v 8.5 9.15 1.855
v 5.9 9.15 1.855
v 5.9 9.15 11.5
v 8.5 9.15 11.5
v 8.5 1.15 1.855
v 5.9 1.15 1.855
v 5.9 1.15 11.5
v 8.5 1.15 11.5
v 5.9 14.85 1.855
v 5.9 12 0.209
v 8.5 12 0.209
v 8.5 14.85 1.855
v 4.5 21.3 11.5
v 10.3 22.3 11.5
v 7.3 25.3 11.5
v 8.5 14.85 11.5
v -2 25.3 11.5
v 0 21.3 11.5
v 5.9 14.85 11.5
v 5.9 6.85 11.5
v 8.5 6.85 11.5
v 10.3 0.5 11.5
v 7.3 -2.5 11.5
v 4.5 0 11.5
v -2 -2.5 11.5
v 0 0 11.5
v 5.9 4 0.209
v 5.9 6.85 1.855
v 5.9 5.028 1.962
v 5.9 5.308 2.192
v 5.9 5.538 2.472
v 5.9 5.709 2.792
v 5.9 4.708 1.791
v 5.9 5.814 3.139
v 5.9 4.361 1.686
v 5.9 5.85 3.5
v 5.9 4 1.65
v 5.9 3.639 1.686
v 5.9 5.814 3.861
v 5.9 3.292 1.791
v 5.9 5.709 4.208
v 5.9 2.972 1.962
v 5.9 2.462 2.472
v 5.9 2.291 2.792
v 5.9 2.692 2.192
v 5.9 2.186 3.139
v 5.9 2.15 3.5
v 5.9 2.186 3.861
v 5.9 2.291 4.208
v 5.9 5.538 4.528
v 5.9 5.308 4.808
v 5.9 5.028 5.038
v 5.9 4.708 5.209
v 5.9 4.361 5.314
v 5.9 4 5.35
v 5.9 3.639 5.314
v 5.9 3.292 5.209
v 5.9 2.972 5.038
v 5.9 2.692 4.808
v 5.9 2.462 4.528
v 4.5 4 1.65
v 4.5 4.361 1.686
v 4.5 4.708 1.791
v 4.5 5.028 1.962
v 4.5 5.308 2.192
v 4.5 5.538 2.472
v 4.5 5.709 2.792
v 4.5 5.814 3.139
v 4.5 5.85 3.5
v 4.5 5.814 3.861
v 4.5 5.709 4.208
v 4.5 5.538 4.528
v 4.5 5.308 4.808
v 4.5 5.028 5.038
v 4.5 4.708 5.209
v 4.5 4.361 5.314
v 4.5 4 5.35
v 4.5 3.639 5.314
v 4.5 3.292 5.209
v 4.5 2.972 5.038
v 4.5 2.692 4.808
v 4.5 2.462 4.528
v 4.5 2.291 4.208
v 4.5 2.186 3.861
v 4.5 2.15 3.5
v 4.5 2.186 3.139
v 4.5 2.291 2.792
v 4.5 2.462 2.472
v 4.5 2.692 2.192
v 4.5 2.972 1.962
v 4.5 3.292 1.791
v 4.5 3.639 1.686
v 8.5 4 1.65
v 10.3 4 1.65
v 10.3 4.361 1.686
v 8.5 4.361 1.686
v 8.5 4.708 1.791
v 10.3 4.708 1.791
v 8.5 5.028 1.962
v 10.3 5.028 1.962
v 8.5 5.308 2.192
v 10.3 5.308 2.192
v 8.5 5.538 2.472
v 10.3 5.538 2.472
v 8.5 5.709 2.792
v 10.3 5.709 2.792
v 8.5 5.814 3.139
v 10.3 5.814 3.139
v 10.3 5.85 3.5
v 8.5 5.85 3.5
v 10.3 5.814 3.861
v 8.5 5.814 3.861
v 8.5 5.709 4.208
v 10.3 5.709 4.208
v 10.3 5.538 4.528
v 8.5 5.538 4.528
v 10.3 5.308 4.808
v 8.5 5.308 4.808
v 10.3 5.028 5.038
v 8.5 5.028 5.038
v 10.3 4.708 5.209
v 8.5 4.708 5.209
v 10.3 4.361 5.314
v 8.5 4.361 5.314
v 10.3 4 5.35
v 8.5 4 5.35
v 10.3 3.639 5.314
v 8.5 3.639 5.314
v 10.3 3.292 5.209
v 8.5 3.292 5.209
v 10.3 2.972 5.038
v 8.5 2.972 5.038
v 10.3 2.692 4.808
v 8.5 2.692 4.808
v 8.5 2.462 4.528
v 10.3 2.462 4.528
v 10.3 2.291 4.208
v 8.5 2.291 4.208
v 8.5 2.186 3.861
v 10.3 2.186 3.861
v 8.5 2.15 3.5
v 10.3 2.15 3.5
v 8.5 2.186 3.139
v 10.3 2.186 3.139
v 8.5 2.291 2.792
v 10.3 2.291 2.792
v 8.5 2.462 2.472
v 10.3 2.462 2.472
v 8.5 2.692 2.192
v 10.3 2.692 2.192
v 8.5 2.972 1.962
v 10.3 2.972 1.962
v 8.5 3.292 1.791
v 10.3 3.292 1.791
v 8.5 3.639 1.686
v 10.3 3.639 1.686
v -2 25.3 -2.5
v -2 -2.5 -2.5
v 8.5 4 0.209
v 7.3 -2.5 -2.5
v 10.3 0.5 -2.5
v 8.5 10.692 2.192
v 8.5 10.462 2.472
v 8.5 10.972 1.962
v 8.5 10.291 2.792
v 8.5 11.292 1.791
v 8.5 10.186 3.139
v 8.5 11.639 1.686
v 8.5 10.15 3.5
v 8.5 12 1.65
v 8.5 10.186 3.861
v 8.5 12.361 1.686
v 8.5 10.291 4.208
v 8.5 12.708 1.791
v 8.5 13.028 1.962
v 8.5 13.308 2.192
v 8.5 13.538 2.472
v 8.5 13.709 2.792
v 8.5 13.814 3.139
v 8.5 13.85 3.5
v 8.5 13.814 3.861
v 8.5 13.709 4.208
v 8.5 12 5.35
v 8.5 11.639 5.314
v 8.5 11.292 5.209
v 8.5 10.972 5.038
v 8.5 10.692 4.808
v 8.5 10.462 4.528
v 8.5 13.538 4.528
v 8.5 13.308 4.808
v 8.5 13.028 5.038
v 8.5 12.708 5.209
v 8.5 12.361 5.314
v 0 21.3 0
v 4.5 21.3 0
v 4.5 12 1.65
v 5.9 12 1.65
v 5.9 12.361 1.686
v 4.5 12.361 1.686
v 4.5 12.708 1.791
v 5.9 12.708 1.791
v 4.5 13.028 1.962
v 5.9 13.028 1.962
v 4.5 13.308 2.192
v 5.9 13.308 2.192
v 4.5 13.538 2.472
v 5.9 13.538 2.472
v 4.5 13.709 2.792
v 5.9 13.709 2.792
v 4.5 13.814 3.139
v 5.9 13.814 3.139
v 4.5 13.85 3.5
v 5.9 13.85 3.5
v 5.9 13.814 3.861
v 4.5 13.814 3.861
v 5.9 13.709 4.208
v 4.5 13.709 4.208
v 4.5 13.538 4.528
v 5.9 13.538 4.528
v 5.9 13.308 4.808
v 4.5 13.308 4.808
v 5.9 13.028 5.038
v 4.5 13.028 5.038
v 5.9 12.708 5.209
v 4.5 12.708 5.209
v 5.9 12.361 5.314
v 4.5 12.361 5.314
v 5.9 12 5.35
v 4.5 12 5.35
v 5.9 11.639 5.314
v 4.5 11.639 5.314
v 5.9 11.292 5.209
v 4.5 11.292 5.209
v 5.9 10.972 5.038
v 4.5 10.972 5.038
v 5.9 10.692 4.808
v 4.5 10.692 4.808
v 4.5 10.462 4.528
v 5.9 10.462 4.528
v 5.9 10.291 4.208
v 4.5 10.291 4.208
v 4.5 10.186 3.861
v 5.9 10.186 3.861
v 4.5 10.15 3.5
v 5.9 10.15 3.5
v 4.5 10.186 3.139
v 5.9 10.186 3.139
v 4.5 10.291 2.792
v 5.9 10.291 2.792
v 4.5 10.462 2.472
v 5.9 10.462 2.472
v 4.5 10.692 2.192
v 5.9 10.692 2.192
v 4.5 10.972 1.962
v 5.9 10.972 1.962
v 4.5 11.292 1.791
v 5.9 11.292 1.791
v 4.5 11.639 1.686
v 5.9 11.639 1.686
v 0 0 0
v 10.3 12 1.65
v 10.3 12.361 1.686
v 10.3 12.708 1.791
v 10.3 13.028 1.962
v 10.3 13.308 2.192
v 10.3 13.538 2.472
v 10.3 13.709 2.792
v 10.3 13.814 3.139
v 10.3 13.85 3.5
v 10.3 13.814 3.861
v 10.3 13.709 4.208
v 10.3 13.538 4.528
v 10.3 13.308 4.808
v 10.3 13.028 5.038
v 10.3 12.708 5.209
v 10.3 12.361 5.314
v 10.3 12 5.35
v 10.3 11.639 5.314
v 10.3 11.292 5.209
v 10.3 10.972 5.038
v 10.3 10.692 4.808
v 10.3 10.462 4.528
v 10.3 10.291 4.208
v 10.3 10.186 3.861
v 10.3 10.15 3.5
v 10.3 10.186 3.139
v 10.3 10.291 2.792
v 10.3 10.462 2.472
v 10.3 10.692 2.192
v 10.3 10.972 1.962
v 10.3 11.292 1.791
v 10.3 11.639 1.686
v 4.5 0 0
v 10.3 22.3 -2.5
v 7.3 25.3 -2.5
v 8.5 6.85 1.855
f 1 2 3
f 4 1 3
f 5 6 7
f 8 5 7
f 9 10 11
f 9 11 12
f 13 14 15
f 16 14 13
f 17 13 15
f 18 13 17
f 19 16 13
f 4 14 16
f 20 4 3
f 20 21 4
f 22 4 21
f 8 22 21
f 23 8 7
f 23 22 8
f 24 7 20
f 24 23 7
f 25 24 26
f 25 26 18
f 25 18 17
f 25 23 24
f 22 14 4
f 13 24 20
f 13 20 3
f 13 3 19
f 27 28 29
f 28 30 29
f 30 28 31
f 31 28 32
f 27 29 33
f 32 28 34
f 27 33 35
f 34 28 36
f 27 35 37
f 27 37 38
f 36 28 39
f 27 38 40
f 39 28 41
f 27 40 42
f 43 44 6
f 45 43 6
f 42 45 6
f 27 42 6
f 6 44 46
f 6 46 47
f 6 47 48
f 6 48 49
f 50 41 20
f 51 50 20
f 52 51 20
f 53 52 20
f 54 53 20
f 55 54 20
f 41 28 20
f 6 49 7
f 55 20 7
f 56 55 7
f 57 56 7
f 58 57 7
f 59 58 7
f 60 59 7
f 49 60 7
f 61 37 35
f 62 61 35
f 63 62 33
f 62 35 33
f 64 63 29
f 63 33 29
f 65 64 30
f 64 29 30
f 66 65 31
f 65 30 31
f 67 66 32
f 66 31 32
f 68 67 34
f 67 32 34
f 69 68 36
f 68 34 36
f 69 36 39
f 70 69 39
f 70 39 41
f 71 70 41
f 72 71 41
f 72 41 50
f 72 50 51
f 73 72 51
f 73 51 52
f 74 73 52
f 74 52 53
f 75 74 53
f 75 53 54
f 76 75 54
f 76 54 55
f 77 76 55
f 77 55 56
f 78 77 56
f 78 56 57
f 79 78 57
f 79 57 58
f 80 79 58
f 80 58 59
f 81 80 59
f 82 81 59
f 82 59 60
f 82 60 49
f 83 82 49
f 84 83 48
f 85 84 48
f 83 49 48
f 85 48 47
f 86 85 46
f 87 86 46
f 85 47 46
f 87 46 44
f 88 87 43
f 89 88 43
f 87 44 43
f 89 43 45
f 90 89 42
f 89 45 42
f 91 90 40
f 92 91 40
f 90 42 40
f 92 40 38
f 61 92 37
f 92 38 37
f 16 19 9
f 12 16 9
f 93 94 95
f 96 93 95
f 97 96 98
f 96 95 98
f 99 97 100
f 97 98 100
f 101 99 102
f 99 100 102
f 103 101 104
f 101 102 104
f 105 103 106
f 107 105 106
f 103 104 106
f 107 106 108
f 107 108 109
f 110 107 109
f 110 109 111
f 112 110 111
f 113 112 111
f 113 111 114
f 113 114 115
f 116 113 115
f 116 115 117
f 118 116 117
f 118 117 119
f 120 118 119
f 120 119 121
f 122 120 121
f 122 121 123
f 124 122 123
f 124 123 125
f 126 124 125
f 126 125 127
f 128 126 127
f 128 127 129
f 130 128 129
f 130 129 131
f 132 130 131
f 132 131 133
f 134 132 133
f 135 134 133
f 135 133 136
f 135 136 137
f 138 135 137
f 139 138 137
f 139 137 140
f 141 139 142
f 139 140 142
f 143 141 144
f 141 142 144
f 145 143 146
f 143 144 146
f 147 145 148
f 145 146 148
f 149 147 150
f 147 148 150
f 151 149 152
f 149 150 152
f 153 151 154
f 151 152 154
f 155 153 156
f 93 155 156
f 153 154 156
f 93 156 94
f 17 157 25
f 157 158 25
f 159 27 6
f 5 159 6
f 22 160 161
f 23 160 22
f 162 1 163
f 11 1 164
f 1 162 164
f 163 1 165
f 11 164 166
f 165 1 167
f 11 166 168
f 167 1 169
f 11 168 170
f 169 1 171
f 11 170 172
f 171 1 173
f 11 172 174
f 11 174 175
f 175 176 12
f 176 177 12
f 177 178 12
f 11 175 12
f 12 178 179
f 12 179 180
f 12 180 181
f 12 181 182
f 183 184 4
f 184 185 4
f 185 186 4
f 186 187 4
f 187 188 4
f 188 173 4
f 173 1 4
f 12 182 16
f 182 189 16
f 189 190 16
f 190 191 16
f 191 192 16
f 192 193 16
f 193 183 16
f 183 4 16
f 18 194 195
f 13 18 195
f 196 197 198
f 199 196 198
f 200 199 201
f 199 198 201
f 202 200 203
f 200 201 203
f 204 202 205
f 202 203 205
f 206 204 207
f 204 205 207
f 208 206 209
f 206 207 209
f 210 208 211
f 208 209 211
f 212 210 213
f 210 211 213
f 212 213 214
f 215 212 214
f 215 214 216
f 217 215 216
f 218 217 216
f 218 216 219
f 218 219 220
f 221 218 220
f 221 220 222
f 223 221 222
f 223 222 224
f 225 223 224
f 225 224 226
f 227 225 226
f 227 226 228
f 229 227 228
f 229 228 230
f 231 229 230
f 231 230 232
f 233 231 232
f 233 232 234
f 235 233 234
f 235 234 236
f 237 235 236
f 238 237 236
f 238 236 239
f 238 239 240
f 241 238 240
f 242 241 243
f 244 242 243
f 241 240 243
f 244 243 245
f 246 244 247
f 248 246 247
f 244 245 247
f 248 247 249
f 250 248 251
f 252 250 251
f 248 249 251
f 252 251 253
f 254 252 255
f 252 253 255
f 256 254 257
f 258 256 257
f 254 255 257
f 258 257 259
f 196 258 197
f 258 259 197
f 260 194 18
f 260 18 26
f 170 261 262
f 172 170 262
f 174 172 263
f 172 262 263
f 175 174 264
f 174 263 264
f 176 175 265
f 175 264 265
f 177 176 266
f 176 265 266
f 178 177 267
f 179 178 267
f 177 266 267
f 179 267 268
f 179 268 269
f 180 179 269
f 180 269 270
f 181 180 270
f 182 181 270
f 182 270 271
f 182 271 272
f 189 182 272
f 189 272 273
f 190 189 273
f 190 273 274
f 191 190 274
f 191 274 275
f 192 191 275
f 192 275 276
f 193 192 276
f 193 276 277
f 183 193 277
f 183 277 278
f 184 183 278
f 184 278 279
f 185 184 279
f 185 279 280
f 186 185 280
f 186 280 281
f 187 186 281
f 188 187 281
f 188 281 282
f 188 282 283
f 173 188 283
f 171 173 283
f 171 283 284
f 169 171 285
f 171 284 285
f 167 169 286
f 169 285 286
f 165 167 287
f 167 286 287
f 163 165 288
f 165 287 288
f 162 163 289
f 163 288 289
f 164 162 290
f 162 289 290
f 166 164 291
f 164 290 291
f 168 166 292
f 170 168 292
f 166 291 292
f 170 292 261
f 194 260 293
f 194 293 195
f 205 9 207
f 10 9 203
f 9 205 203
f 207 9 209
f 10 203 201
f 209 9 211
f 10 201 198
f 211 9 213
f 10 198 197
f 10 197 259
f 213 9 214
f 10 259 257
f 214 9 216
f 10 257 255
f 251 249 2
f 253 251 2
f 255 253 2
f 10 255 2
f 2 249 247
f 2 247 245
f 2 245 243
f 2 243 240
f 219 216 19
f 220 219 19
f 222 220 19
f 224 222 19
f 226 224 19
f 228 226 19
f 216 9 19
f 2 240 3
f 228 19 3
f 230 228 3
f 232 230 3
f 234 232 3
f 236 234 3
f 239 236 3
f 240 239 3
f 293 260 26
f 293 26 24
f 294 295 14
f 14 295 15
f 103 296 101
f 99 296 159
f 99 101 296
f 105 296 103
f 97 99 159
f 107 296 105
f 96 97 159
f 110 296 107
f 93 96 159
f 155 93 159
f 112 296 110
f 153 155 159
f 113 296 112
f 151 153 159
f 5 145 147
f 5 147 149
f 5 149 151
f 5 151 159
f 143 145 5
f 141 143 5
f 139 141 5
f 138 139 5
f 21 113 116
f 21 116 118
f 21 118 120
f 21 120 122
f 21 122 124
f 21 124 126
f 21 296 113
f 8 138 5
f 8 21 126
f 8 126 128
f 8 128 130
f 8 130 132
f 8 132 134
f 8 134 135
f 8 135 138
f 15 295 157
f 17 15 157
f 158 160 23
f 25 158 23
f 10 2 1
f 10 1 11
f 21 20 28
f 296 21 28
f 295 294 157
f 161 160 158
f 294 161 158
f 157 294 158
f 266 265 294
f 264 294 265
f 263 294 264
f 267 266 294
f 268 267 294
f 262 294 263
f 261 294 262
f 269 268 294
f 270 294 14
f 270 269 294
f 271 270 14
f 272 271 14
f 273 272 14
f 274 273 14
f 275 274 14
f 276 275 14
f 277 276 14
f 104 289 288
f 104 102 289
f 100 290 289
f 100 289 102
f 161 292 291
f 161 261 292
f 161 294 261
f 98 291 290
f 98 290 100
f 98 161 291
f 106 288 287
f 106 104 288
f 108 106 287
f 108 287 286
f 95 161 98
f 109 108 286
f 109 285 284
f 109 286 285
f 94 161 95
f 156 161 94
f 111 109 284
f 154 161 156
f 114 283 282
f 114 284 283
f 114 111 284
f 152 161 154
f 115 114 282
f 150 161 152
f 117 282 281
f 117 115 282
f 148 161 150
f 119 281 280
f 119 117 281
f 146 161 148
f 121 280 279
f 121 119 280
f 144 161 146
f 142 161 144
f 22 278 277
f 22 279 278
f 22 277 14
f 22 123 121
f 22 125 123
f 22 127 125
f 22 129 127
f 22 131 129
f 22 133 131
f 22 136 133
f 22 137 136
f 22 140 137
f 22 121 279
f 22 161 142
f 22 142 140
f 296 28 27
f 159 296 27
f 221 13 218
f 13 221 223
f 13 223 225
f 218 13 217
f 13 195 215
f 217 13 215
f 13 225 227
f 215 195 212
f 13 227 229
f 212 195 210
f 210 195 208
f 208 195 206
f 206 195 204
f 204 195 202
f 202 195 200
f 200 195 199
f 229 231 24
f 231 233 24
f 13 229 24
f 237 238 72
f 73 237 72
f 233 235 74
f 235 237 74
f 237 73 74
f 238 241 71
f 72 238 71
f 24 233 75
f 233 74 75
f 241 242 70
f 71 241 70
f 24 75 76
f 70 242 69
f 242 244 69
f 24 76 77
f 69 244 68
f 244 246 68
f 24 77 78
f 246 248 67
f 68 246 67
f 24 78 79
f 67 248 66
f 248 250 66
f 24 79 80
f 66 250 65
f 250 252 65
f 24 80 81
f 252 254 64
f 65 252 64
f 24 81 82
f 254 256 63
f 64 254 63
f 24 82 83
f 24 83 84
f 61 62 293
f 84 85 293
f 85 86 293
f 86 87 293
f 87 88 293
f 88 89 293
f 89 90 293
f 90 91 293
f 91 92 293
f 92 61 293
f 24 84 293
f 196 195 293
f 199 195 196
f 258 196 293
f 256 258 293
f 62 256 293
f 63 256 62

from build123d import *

# Parameters (mm, degrees)
SKETCH1_W           = 26.3
SKETCH1_H           = 14
SKETCH1_W_2         = 21.3
SKETCH1_H_2         = 9
EXTRUDE_THIN1_DEPTH = 4.5
SKETCH2_W           = 26.3
SKETCH2_H           = 14
BOSS_EXTRUDE1_DEPTH = 5.8
SKETCH3_W           = 26.3
SKETCH3_H           = 14
BOSS_EXTRUDE2_DEPTH = 2
SKETCH4_W           = 4.5
SKETCH4_H           = 21.3
CUT_EXTRUDE1_DEPTH  = 18
CUT_EXTRUDE4_DEPTH  = 4
SKETCH8_W           = 21.3
SKETCH8_H           = 11.5
BOSS_EXTRUDE3_DEPTH = 1.4
SKETCH5_R           = 1.85
CUT_EXTRUDE2_DEPTH  = 10
SKETCH9_W           = 12.3
SKETCH9_H           = 14
BOSS_EXTRUDE4_DEPTH = 1.5
CHAMFER1_SIZE       = 3


with BuildPart() as part:
    # Sketch1 → Extrude-Thin1 (new body)
    with BuildSketch(Plane.YZ):
        with Locations((10.65, 4.5)):
            Rectangle(SKETCH1_W, SKETCH1_H)
        with Locations((10.65, 4.5)):
            Rectangle(SKETCH1_W_2, SKETCH1_H_2, mode=Mode.SUBTRACT)
    extrude(amount=EXTRUDE_THIN1_DEPTH)

    # Sketch2 → Boss-Extrude1 (add)
    with BuildSketch(Plane.YZ.offset(4.5)):
        with Locations((10.65, 4.5)):
            Rectangle(SKETCH2_W, SKETCH2_H)
    extrude(amount=BOSS_EXTRUDE1_DEPTH)

    # Sketch3 → Boss-Extrude2 (add)
    with BuildSketch(Plane(origin=(0, 0, 0), x_dir=(0, -1, 0), z_dir=(-1, 0, 0))):
        with Locations((-10.65, 4.5)):
            Rectangle(SKETCH3_W, SKETCH3_H)
    extrude(amount=BOSS_EXTRUDE2_DEPTH)

    # Sketch4 → Cut-Extrude1 (cut)
    with BuildSketch(Plane(origin=(0, 0, 9), x_dir=(1, 0, 0), z_dir=(0, 0, -1))):
        with Locations((2.25, -10.65)):
            Rectangle(SKETCH4_W, SKETCH4_H)
    extrude(amount=-CUT_EXTRUDE1_DEPTH, mode=Mode.SUBTRACT)

    # Sketch7 → Cut-Extrude4 (cut)
    with BuildSketch(Plane(origin=(4.5, 0, 0), x_dir=(0, -1, 0), z_dir=(-1, 0, 0))):
        Polygon((-14.85, 6.279660954), (-14.85, 11.5), (-9.15, 11.5), (-9.15, 6.691276574), (-9.15, 1.854551733), (-12, 0.209103466), (-14.85, 1.854551733), align=None)
        Polygon((-6.85, 1.854551733), (-4, 0.209103466), (-1.15, 1.854551733), (-1.15, 5.098904977), (-1.15, 11.5), (-6.85, 11.5), (-6.85, 5.026706695), align=None)
    extrude(amount=-CUT_EXTRUDE4_DEPTH, mode=Mode.SUBTRACT)

    # Sketch8 → Boss-Extrude3 (add)
    with BuildSketch(Plane(origin=(4.5, 0, 0), x_dir=(0, -1, 0), z_dir=(-1, 0, 0))):
        with Locations((-10.65, 5.75)):
            Rectangle(SKETCH8_W, SKETCH8_H)
    extrude(amount=-BOSS_EXTRUDE3_DEPTH)

    # Sketch5 → Cut-Extrude2 (cut)
    with BuildSketch(Plane.YZ.offset(10.3)):
        with Locations(Location((4, 3.5, 0), (0, 0, 270))):
            Circle(SKETCH5_R)
        with Locations(Location((12, 3.5, 0), (0, 0, 270))):
            Circle(SKETCH5_R)
    extrude(amount=-CUT_EXTRUDE2_DEPTH, mode=Mode.SUBTRACT)

    # Sketch9 → Boss-Extrude4 (add)
    with BuildSketch(Plane(origin=(0, 23.8, 0), x_dir=(-1, 0, 0), z_dir=(0, 1, 0))):
        with Locations((-4.15, 4.5)):
            Rectangle(SKETCH9_W, SKETCH9_H)
    extrude(amount=BOSS_EXTRUDE4_DEPTH)

    # Chamfer1
    chamfer1_edges = [part.edges().sort_by_distance(p)[0] for p in [
        (10.3, 25.3, 4.5),
        (10.3, -2.5, 4.5),
    ]]
    chamfer(chamfer1_edges, length=CHAMFER1_SIZE)


solid = part.part
